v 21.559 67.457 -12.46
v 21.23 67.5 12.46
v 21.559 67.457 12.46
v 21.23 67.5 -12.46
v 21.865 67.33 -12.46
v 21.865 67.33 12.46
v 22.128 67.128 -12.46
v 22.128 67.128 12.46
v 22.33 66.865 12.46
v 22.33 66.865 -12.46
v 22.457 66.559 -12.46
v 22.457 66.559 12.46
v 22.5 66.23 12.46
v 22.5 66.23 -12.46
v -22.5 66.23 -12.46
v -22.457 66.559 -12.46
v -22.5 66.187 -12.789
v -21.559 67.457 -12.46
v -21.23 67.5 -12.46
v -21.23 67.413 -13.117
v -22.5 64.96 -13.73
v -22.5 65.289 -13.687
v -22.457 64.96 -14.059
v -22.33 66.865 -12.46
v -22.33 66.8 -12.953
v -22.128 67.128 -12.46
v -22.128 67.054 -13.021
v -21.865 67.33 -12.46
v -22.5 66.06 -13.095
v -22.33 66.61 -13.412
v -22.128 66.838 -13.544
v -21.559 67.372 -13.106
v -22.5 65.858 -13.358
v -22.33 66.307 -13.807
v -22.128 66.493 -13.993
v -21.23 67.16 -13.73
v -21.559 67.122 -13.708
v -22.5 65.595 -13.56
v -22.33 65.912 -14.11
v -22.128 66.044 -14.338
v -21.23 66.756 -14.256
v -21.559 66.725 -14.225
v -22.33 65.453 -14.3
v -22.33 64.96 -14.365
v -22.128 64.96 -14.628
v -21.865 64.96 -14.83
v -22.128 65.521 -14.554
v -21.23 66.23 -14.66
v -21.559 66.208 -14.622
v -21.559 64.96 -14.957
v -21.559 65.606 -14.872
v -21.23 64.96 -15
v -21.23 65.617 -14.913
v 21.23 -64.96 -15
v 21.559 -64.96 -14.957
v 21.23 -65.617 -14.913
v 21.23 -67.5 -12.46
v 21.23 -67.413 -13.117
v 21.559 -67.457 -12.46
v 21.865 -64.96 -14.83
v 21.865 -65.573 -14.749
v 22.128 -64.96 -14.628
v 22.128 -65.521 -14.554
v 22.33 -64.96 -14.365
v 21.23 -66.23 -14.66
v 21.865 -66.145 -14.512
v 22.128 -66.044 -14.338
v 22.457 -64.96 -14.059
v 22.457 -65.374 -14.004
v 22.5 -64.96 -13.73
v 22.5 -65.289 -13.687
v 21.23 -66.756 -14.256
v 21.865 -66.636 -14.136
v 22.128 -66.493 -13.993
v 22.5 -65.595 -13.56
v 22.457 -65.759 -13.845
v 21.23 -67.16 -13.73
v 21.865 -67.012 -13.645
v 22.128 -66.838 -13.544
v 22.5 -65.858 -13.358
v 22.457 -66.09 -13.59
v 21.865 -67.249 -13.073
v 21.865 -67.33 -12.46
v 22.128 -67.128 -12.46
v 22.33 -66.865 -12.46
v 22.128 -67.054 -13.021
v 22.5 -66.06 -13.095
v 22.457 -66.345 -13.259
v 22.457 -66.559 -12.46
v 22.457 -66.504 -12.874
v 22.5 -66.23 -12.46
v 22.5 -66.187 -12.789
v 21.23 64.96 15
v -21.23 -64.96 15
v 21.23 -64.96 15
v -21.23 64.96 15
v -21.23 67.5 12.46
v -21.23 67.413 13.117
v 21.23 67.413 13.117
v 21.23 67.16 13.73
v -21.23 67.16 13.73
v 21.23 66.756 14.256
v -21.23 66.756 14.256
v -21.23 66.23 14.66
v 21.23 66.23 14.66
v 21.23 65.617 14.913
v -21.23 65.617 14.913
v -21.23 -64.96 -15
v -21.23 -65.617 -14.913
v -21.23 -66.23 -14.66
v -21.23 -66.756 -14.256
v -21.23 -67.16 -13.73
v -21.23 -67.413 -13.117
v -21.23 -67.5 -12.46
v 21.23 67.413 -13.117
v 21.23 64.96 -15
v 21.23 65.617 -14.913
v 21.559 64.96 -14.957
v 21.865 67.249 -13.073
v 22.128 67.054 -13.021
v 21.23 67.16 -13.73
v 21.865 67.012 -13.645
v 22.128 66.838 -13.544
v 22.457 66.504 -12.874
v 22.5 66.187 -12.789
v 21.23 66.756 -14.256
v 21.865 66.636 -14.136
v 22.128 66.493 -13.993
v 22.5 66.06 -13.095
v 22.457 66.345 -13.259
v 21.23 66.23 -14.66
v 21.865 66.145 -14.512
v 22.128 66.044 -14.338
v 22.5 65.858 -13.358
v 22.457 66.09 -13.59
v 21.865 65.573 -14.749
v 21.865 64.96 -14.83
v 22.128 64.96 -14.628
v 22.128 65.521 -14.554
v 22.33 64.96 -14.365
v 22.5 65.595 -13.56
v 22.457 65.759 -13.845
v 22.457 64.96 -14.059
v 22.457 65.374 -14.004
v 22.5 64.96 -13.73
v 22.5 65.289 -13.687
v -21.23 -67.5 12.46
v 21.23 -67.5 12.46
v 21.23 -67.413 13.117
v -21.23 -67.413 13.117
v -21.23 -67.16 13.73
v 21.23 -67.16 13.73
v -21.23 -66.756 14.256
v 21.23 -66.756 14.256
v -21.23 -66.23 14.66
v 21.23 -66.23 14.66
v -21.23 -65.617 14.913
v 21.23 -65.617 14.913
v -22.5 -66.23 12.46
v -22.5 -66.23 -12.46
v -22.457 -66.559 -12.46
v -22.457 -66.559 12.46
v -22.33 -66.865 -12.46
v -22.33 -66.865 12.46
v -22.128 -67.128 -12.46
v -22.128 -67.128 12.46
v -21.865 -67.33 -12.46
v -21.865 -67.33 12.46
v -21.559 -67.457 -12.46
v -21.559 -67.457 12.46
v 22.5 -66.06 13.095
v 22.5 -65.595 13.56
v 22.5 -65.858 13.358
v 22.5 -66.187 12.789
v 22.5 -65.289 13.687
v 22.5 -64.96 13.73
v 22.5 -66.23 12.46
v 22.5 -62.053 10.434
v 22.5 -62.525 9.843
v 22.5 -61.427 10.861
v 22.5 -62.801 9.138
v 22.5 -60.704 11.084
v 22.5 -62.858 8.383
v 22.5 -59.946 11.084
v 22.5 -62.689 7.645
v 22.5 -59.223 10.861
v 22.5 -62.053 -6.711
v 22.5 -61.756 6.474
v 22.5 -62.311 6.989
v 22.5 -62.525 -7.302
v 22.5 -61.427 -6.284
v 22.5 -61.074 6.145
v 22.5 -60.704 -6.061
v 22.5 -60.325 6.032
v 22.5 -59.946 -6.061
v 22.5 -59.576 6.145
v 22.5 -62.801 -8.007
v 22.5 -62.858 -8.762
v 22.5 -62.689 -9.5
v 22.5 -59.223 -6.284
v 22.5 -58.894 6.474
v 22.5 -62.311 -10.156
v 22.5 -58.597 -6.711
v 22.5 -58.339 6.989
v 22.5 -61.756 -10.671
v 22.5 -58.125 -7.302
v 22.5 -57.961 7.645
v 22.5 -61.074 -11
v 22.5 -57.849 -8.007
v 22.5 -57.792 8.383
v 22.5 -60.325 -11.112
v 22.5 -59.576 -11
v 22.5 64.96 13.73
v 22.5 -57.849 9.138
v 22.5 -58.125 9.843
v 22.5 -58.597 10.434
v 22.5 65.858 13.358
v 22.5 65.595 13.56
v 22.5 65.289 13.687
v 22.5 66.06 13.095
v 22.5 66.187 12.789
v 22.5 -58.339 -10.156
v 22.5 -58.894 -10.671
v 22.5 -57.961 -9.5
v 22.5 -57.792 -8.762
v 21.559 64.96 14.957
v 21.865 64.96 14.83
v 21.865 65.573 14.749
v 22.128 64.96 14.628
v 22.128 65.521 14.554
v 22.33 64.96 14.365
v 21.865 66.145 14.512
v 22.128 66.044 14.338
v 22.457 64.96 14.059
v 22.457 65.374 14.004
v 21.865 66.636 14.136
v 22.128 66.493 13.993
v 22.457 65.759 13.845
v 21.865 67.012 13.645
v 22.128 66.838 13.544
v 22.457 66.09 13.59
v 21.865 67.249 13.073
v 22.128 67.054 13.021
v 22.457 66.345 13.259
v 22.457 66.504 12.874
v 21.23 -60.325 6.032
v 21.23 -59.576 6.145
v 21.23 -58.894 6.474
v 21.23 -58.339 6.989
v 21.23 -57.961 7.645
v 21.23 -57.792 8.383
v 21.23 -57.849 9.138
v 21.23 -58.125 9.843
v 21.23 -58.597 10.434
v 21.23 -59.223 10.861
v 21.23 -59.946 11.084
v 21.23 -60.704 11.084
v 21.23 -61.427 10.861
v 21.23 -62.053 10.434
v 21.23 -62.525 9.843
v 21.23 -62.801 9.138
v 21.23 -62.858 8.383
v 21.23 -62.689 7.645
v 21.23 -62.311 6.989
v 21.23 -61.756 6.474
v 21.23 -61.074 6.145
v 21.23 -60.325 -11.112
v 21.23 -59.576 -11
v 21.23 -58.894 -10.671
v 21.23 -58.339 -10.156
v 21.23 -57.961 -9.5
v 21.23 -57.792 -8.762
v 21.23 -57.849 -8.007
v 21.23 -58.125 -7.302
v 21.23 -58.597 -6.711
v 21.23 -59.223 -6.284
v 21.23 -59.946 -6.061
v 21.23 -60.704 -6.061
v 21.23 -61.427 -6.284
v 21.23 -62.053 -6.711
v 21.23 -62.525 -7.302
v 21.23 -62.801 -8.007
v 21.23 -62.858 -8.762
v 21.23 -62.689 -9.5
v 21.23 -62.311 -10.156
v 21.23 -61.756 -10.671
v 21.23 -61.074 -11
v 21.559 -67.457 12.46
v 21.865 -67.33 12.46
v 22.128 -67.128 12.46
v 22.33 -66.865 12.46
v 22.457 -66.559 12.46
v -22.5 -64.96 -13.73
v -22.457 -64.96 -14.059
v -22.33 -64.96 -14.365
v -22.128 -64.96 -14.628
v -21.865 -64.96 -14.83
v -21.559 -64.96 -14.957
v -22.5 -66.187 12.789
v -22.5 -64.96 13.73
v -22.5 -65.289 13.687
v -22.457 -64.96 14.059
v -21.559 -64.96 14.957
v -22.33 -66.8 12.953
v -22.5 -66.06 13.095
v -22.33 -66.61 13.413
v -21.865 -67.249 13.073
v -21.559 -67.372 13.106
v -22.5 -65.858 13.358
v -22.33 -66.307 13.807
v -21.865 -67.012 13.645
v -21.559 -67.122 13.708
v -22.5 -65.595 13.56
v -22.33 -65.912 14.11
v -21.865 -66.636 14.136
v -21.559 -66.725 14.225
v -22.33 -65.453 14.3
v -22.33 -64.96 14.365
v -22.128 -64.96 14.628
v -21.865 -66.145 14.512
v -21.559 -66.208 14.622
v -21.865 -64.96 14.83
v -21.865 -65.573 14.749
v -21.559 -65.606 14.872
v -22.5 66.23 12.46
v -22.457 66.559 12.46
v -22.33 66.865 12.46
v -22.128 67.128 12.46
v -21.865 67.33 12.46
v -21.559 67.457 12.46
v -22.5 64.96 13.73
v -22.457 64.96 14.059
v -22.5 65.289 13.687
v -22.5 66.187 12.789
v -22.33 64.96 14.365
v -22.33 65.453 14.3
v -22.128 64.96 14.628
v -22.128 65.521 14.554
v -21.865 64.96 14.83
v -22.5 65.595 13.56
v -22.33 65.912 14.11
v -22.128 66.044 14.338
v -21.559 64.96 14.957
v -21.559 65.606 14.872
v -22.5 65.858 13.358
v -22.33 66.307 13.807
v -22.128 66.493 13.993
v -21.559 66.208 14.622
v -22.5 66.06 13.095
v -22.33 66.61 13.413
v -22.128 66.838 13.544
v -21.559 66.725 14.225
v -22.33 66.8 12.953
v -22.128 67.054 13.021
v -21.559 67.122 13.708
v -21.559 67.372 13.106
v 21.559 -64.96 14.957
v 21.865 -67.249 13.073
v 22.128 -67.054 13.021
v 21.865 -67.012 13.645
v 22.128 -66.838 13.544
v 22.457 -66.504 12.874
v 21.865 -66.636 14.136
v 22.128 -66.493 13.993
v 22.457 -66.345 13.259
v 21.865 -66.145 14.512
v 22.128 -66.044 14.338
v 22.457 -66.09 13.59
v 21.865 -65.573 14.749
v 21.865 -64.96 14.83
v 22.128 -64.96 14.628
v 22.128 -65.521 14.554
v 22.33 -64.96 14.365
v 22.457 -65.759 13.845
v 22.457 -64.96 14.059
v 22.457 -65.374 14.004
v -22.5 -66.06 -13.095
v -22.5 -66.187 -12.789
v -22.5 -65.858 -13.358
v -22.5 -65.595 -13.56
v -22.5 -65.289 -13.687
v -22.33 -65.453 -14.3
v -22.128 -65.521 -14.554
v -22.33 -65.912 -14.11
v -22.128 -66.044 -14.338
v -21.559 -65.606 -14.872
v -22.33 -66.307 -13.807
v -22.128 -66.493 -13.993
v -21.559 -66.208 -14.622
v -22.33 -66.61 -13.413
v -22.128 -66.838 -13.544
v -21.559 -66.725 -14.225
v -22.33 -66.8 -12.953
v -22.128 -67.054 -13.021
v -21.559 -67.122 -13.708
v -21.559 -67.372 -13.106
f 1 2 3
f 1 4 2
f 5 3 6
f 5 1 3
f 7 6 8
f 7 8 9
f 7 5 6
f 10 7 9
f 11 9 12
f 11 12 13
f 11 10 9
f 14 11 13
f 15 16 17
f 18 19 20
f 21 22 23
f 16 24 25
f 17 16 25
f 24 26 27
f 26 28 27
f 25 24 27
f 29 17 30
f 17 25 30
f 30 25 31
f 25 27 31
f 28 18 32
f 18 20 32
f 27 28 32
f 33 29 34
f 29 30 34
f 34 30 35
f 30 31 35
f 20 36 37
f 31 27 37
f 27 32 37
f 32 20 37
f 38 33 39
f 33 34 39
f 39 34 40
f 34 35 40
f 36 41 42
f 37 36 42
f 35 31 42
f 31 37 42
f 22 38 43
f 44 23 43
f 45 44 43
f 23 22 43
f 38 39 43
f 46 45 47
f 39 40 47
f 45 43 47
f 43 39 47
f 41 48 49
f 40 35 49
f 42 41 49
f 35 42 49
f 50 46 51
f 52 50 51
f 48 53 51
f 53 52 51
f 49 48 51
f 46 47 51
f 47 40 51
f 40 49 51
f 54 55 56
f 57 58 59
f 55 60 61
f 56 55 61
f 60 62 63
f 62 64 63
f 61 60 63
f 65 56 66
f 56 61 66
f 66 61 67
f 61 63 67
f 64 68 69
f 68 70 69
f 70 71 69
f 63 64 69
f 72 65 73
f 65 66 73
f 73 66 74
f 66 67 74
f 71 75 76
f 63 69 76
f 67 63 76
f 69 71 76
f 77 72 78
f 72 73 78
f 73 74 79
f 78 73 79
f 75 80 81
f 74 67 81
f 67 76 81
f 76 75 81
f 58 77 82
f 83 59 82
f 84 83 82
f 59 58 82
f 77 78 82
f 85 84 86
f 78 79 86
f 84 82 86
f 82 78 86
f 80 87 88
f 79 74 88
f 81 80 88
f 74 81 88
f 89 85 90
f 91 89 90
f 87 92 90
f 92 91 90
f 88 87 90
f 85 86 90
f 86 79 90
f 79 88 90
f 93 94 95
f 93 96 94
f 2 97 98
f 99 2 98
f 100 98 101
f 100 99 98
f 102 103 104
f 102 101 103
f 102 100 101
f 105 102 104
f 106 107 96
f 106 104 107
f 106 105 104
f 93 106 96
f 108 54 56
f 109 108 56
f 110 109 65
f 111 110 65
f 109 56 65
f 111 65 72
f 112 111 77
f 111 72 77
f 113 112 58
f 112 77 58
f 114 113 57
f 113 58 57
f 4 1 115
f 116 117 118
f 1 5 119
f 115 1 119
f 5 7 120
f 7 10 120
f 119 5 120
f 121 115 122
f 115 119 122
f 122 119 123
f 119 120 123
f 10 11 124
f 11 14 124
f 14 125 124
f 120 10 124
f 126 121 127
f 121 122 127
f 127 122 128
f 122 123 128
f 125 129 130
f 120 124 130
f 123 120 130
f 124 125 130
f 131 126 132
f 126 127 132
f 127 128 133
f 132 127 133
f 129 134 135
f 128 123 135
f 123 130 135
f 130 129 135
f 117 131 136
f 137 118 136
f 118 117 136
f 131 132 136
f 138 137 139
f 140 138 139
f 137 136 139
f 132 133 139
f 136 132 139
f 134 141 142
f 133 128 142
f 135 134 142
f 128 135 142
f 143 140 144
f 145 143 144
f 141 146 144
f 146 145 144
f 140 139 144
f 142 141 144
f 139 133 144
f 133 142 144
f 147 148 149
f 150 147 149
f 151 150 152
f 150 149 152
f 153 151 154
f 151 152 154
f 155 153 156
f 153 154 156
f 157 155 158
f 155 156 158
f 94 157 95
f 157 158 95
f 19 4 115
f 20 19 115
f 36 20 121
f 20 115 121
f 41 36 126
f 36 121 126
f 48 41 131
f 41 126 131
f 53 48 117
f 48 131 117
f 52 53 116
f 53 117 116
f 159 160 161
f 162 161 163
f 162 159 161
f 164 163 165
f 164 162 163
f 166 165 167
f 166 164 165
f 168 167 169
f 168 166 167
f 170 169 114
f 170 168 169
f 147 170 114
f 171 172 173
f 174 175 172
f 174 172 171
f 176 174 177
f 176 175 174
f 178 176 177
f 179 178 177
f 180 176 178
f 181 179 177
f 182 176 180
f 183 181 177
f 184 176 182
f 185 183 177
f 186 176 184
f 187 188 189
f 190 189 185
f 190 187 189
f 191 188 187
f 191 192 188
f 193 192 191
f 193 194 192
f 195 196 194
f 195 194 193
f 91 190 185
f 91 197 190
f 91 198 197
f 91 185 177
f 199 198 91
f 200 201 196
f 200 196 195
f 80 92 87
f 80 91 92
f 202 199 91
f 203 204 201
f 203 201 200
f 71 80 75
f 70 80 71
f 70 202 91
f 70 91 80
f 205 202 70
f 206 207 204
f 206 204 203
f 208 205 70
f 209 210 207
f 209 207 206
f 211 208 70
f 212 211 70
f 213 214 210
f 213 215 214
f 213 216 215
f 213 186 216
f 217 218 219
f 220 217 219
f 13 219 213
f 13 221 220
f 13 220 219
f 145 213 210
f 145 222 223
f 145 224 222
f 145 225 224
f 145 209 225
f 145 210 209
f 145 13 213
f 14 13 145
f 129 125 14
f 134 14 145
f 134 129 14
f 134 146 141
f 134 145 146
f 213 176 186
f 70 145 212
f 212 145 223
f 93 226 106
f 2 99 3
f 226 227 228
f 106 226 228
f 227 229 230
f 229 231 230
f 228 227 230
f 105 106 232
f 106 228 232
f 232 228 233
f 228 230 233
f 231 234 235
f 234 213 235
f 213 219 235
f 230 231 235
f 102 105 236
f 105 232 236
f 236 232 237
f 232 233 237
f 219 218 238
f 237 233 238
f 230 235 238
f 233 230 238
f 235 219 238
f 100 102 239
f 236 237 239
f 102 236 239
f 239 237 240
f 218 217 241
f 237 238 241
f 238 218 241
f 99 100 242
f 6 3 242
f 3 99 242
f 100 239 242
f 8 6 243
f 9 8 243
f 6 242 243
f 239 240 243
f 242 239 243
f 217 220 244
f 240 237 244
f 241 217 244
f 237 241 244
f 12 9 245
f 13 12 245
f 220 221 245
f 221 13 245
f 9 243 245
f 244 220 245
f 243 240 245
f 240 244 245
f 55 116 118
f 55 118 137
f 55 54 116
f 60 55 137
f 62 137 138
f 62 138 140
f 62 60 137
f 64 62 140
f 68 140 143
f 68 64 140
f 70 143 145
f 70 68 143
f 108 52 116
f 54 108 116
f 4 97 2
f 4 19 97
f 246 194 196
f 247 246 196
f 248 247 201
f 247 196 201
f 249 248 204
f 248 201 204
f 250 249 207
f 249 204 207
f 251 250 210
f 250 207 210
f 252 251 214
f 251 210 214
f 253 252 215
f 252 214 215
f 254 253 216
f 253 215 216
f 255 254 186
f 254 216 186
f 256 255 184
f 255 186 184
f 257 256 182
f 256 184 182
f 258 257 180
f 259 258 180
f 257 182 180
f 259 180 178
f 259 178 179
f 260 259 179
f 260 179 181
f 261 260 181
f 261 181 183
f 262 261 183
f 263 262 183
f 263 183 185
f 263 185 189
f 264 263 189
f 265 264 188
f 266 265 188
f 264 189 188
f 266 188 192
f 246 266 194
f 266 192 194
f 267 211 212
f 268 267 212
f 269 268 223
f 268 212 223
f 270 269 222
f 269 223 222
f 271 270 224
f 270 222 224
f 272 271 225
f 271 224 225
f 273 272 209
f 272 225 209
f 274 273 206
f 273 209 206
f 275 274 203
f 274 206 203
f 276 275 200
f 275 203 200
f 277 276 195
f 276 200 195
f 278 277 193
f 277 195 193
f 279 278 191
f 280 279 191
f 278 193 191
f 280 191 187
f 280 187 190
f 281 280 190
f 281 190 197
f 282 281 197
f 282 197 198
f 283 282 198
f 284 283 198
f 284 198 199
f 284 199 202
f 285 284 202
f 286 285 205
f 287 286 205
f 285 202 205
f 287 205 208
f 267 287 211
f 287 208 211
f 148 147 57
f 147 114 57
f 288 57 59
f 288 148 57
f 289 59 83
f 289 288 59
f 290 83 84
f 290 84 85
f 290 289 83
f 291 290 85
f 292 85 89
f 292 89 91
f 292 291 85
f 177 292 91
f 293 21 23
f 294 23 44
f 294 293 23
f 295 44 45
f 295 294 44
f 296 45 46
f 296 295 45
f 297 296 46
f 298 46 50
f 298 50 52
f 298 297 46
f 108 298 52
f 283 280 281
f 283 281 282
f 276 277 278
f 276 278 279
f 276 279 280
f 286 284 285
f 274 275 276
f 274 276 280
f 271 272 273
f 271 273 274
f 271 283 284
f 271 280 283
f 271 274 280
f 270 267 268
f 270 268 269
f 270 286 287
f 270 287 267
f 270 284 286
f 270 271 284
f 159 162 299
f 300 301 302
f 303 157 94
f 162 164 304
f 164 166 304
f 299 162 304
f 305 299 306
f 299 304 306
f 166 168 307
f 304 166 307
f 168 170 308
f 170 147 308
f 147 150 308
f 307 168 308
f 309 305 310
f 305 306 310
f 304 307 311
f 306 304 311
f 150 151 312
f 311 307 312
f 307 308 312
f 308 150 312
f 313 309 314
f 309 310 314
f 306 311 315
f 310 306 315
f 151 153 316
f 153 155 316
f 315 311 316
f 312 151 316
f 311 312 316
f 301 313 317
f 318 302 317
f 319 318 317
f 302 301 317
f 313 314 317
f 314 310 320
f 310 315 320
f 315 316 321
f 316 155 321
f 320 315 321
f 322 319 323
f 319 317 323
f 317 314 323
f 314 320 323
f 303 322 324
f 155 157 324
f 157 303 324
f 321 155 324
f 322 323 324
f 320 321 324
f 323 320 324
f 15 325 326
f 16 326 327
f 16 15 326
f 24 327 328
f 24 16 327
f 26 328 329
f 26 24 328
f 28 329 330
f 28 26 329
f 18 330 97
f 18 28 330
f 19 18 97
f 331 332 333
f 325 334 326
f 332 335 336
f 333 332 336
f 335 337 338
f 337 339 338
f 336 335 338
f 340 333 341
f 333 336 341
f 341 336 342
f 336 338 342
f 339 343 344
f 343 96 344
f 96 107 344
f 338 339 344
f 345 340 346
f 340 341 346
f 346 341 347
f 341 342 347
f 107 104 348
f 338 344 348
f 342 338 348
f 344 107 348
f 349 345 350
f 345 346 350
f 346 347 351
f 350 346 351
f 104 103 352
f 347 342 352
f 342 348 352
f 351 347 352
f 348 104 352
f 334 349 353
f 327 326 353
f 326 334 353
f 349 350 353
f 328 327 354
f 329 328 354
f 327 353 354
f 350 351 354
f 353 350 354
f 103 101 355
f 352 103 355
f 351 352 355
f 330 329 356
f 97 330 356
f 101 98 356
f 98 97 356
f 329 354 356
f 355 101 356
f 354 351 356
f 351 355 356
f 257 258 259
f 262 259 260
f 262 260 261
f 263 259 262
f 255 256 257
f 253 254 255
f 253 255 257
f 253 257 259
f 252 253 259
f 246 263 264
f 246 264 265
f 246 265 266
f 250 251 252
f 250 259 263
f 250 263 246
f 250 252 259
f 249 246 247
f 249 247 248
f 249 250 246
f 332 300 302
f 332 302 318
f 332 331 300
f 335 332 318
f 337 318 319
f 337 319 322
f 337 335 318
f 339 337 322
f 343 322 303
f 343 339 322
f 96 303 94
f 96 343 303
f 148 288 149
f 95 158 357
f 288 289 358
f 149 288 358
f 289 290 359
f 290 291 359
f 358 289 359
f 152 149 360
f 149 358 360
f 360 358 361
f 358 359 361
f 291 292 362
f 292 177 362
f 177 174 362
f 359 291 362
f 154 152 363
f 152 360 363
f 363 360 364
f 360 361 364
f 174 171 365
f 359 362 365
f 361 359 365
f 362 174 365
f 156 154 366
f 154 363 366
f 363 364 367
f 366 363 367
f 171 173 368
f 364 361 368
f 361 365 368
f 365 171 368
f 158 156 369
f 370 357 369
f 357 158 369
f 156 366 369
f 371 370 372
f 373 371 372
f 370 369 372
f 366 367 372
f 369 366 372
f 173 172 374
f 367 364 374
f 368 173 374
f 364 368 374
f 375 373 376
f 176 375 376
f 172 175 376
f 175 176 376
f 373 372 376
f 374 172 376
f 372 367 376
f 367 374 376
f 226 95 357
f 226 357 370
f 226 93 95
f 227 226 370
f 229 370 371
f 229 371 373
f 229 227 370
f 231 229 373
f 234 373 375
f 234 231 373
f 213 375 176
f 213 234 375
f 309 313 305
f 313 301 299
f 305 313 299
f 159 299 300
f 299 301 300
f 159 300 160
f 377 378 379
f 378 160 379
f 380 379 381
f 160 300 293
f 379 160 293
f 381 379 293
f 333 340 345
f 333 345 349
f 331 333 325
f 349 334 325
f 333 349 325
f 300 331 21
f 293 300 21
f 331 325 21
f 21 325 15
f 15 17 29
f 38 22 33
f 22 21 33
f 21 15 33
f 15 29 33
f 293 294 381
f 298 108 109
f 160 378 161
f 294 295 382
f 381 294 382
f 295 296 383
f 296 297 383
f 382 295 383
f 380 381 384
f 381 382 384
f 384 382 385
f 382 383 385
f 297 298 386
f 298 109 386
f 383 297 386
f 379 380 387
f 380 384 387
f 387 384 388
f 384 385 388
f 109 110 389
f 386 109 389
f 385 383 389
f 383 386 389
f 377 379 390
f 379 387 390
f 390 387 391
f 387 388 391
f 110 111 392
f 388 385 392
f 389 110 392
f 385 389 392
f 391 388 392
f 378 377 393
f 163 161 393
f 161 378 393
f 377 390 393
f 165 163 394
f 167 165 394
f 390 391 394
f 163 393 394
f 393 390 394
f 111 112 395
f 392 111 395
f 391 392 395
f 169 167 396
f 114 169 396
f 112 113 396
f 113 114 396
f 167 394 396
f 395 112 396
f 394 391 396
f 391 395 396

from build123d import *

# Parameters (mm, degrees)
SKETCH1_W           = 45
SKETCH1_H           = 30
BOSS_EXTRUDE1_DEPTH = 67.5
FILLET1_R           = 2.54
FILLET2_R           = 1.27
SKETCH2_R           = 2.54
CUT_EXTRUDE1_DEPTH  = 1.27


with BuildPart() as part:
    # Sketch1 → Boss-Extrude1 (new, symmetric)
    with BuildSketch(Plane(origin=(0, 0, 0), x_dir=(1, 0, 0), z_dir=(0, 1, 0))):
        Rectangle(SKETCH1_W, SKETCH1_H)
    extrude(amount=BOSS_EXTRUDE1_DEPTH, both=True)

    # Fillet1
    fillet1_edges = [part.edges().sort_by_distance(p)[0] for p in [
        (0, 67.5, 15),
        (0, -67.5, 15),
        (0, -67.5, -15),
        (0, 67.5, -15),
    ]]
    fillet(fillet1_edges, radius=FILLET1_R)

    # Fillet2
    fillet2_edges = [part.edges().sort_by_distance(p)[0] for p in [
        (22.5, 0, 15),
        (-22.5, 0, 15),
        (22.5, -67.5, 0),
        (22.5, 0, -15),
        (22.5, 67.5, 0),
        (22.5, 66.756051224, -14.256051224),
        (22.5, 66.756051224, 14.256051224),
        (22.5, -66.756051224, -14.256051224),
        (22.5, -66.756051224, 14.256051224),
        (-22.5, -67.5, 0),
        (-22.5, 67.5, 0),
        (-22.5, 0, -15),
        (-22.5, 66.756051224, -14.256051224),
        (-22.5, 66.756051224, 14.256051224),
        (-22.5, -66.756051224, -14.256051224),
        (-22.5, -66.756051224, 14.256051224),
    ]]
    fillet(fillet2_edges, radius=FILLET2_R)

    # Sketch2 → Cut-Extrude1 (cut)
    with BuildSketch(Plane(origin=(22.5, 0, 0), x_dir=(0, 0, -1), z_dir=(1, 0, 0))):
        with Locations((8.5725, -60.325)):
            Circle(SKETCH2_R)
        with Locations((-8.5725, -60.325)):
            Circle(SKETCH2_R)
    extrude(amount=-CUT_EXTRUDE1_DEPTH, mode=Mode.SUBTRACT)


solid = part.part
